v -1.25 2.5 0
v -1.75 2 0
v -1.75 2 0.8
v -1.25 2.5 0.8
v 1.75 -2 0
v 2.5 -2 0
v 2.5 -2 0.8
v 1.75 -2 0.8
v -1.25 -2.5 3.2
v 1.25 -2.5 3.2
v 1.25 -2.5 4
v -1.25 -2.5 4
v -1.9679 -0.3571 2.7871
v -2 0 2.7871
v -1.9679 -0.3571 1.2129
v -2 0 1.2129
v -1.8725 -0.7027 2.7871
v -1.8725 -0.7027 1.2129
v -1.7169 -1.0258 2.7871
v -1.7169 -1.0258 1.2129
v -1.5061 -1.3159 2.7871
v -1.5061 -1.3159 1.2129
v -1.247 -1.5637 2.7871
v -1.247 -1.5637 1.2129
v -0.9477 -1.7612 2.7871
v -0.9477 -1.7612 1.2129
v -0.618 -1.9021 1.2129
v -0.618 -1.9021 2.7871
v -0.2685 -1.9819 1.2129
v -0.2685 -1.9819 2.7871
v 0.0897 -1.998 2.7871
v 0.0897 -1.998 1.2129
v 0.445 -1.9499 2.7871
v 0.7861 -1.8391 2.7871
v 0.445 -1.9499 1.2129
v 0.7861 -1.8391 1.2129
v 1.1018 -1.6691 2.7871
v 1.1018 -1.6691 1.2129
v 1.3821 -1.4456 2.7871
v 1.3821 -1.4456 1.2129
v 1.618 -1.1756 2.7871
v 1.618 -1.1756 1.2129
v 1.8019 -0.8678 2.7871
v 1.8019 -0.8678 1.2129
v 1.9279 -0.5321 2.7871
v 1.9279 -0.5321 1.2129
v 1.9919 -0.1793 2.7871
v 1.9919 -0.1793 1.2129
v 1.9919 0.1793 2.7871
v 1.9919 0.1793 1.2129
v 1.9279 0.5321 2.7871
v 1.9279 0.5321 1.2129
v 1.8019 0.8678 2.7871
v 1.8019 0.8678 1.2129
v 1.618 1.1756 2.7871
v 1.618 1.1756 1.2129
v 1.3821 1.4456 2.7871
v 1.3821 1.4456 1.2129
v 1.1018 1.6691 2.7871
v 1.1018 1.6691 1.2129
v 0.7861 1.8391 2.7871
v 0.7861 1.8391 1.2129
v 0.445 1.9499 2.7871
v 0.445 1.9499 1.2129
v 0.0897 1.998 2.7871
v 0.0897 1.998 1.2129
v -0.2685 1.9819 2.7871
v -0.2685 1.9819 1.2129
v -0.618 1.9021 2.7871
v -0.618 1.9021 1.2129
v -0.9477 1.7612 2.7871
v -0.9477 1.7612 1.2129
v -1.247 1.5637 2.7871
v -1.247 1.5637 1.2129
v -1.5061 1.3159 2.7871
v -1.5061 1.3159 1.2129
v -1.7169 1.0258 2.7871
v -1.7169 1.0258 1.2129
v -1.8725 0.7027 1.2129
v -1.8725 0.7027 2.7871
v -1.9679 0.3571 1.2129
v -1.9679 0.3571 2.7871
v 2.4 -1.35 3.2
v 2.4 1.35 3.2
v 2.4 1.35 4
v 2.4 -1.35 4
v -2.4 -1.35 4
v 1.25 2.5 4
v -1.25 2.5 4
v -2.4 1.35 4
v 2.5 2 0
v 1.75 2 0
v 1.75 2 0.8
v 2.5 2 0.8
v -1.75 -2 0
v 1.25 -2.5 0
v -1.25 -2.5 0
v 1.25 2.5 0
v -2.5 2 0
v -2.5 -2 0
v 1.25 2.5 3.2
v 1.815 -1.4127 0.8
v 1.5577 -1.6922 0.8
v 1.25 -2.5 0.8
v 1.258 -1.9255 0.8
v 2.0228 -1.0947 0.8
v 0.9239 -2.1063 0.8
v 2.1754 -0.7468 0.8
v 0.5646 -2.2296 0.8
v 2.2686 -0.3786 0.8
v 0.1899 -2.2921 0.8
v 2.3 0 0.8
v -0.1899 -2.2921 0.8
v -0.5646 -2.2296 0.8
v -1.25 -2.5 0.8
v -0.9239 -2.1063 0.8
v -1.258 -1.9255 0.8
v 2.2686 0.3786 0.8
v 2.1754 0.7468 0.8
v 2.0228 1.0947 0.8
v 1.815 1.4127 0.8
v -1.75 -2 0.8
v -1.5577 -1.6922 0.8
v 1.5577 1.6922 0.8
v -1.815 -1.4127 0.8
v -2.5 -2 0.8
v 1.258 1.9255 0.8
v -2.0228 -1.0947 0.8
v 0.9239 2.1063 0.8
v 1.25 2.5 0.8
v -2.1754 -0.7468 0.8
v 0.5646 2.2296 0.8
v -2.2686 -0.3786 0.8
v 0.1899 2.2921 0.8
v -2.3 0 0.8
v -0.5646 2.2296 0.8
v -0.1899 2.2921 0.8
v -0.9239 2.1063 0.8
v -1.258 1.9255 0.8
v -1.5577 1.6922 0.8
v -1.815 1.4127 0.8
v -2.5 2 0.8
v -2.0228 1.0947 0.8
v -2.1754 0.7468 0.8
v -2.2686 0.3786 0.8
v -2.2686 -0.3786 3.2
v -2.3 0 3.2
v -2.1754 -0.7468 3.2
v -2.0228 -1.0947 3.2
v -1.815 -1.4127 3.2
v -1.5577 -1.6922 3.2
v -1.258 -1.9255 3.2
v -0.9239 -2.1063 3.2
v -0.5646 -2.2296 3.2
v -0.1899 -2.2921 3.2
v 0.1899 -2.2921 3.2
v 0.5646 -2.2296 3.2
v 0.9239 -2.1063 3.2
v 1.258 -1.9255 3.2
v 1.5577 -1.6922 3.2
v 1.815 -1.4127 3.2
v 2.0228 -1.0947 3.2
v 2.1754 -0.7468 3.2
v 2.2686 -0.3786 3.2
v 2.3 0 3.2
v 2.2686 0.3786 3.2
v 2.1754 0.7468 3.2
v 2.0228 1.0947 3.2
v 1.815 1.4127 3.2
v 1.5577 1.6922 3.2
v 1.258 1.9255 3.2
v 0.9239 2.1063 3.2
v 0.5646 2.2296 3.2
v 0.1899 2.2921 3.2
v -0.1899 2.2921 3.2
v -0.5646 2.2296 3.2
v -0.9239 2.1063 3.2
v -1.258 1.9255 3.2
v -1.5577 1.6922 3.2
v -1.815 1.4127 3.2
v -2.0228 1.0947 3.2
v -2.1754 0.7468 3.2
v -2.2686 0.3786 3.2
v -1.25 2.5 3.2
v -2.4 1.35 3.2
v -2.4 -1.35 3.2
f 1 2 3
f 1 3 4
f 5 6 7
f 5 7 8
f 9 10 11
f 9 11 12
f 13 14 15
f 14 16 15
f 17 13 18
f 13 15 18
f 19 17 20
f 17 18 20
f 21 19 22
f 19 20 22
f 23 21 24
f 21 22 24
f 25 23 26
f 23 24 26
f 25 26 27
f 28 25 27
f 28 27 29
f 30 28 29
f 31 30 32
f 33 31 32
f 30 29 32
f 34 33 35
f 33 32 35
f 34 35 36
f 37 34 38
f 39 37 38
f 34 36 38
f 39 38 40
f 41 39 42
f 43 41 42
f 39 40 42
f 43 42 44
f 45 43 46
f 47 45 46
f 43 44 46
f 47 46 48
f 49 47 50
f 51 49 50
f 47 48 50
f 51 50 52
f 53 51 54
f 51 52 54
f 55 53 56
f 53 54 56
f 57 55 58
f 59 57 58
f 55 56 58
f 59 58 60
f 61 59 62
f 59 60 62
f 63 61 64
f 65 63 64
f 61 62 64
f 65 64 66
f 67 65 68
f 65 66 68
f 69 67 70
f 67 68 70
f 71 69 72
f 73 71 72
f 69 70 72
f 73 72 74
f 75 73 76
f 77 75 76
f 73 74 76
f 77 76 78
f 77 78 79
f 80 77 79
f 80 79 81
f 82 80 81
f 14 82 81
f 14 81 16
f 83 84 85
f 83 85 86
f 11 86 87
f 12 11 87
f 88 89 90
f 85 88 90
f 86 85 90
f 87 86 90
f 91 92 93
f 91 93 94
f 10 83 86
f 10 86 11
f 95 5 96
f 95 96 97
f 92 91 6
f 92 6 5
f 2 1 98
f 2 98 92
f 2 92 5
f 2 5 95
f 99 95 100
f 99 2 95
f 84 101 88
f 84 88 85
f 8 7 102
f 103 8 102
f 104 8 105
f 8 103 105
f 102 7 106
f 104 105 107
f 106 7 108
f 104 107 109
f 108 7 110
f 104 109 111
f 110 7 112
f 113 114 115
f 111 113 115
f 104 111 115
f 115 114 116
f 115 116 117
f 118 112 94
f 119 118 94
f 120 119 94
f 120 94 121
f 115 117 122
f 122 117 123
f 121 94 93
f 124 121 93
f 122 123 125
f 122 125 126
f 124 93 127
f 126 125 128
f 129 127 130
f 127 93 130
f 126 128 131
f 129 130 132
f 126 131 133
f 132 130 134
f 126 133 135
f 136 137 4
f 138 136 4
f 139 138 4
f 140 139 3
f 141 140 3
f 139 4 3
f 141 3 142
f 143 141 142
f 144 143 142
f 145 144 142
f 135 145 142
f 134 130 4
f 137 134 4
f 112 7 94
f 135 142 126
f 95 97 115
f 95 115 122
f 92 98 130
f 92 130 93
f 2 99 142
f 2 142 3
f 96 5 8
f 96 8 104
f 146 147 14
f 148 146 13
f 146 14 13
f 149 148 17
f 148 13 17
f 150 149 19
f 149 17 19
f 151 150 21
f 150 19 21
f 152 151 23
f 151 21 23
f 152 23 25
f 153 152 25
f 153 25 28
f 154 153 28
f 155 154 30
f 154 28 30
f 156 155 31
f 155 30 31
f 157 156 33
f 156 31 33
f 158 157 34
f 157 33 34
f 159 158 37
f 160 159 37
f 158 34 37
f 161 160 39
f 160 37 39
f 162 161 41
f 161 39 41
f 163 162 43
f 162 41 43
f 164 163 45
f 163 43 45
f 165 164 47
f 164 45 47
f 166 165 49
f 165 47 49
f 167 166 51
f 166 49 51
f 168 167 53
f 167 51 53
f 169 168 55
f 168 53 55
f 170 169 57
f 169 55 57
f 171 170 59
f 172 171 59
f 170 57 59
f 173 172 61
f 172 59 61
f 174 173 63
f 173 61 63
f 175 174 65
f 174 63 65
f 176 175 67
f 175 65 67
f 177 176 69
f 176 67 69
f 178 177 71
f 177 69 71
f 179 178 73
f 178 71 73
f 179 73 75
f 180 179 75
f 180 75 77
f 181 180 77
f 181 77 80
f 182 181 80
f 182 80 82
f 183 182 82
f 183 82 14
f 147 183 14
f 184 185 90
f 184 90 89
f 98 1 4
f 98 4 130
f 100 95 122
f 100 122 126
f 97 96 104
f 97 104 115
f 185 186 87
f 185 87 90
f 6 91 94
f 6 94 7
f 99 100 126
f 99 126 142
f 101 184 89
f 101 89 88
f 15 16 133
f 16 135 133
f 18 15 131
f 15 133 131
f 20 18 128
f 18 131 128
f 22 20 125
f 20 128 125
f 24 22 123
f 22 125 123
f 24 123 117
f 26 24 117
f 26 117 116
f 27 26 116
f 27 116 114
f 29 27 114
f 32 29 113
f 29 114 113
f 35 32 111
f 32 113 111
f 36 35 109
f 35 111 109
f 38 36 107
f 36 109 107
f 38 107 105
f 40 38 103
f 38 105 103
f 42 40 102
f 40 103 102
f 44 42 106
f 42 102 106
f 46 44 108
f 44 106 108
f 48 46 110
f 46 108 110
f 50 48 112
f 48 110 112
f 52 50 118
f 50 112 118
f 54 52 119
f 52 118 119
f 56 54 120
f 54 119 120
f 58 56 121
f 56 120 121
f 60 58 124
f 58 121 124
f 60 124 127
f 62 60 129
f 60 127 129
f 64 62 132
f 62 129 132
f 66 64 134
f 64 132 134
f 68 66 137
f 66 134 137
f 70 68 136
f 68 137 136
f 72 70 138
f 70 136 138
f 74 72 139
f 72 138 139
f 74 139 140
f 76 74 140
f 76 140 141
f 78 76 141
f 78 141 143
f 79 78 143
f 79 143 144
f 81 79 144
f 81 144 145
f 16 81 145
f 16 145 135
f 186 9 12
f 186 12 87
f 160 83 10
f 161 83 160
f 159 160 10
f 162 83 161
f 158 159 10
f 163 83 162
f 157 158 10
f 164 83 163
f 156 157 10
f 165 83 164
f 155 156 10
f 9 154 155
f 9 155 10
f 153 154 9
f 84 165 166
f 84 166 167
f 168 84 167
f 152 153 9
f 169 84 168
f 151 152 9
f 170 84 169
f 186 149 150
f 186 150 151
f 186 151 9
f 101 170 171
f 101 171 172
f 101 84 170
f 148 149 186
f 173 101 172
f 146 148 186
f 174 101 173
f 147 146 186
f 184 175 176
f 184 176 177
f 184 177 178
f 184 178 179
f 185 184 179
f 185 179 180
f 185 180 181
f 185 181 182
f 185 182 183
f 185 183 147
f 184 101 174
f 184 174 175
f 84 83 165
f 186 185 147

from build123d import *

# Parameters (mm, degrees)
BOSS_EXTRUDE1_DEPTH = 0.8
BOSS_EXTRUDE2_DEPTH = 0.8


with BuildPart() as part:
    # Sketch1 → Boss-Extrude1 (new body)
    with BuildSketch(Plane.XY):
        Polygon((-1.25, 2.5), (1.25, 2.5), (1.75, 2), (2.5, 2), (2.5, -2), (1.75, -2), (1.25, -2.5), (-1.25, -2.5), (-1.75, -2), (-2.5, -2), (-2.5, 2), (-1.75, 2), align=None)
    extrude(amount=BOSS_EXTRUDE1_DEPTH)

    # Sketch2 → Revolve1 (revolve)
    with BuildSketch(Plane(origin=(0, 0, 0), x_dir=(1, 0, 0), z_dir=(0, 1, 0)), mode=Mode.PRIVATE) as revolve1_sk:
        Polygon((0, -0.8), (0, -3.2), (2.3, -3.2), (2, -2.787085424), (2, -1.212914576), (2.3, -0.8), align=None)
    revolve(revolve1_sk.sketch.rotate(Axis((0, 0, 0.8), (0, 0, 1)), 180), axis=Axis((0, 0, 0.8), (0, 0, 1)))

    # Sketch3 → Boss-Extrude2 (add)
    with BuildSketch(Plane.XY.offset(3.2)):
        Polygon((-1.25, 2.5), (1.25, 2.5), (2.4, 1.35), (2.4, -1.35), (1.25, -2.5), (-1.25, -2.5), (-2.4, -1.35), (-2.4, 1.35), align=None)
    extrude(amount=BOSS_EXTRUDE2_DEPTH)


solid = part.part
